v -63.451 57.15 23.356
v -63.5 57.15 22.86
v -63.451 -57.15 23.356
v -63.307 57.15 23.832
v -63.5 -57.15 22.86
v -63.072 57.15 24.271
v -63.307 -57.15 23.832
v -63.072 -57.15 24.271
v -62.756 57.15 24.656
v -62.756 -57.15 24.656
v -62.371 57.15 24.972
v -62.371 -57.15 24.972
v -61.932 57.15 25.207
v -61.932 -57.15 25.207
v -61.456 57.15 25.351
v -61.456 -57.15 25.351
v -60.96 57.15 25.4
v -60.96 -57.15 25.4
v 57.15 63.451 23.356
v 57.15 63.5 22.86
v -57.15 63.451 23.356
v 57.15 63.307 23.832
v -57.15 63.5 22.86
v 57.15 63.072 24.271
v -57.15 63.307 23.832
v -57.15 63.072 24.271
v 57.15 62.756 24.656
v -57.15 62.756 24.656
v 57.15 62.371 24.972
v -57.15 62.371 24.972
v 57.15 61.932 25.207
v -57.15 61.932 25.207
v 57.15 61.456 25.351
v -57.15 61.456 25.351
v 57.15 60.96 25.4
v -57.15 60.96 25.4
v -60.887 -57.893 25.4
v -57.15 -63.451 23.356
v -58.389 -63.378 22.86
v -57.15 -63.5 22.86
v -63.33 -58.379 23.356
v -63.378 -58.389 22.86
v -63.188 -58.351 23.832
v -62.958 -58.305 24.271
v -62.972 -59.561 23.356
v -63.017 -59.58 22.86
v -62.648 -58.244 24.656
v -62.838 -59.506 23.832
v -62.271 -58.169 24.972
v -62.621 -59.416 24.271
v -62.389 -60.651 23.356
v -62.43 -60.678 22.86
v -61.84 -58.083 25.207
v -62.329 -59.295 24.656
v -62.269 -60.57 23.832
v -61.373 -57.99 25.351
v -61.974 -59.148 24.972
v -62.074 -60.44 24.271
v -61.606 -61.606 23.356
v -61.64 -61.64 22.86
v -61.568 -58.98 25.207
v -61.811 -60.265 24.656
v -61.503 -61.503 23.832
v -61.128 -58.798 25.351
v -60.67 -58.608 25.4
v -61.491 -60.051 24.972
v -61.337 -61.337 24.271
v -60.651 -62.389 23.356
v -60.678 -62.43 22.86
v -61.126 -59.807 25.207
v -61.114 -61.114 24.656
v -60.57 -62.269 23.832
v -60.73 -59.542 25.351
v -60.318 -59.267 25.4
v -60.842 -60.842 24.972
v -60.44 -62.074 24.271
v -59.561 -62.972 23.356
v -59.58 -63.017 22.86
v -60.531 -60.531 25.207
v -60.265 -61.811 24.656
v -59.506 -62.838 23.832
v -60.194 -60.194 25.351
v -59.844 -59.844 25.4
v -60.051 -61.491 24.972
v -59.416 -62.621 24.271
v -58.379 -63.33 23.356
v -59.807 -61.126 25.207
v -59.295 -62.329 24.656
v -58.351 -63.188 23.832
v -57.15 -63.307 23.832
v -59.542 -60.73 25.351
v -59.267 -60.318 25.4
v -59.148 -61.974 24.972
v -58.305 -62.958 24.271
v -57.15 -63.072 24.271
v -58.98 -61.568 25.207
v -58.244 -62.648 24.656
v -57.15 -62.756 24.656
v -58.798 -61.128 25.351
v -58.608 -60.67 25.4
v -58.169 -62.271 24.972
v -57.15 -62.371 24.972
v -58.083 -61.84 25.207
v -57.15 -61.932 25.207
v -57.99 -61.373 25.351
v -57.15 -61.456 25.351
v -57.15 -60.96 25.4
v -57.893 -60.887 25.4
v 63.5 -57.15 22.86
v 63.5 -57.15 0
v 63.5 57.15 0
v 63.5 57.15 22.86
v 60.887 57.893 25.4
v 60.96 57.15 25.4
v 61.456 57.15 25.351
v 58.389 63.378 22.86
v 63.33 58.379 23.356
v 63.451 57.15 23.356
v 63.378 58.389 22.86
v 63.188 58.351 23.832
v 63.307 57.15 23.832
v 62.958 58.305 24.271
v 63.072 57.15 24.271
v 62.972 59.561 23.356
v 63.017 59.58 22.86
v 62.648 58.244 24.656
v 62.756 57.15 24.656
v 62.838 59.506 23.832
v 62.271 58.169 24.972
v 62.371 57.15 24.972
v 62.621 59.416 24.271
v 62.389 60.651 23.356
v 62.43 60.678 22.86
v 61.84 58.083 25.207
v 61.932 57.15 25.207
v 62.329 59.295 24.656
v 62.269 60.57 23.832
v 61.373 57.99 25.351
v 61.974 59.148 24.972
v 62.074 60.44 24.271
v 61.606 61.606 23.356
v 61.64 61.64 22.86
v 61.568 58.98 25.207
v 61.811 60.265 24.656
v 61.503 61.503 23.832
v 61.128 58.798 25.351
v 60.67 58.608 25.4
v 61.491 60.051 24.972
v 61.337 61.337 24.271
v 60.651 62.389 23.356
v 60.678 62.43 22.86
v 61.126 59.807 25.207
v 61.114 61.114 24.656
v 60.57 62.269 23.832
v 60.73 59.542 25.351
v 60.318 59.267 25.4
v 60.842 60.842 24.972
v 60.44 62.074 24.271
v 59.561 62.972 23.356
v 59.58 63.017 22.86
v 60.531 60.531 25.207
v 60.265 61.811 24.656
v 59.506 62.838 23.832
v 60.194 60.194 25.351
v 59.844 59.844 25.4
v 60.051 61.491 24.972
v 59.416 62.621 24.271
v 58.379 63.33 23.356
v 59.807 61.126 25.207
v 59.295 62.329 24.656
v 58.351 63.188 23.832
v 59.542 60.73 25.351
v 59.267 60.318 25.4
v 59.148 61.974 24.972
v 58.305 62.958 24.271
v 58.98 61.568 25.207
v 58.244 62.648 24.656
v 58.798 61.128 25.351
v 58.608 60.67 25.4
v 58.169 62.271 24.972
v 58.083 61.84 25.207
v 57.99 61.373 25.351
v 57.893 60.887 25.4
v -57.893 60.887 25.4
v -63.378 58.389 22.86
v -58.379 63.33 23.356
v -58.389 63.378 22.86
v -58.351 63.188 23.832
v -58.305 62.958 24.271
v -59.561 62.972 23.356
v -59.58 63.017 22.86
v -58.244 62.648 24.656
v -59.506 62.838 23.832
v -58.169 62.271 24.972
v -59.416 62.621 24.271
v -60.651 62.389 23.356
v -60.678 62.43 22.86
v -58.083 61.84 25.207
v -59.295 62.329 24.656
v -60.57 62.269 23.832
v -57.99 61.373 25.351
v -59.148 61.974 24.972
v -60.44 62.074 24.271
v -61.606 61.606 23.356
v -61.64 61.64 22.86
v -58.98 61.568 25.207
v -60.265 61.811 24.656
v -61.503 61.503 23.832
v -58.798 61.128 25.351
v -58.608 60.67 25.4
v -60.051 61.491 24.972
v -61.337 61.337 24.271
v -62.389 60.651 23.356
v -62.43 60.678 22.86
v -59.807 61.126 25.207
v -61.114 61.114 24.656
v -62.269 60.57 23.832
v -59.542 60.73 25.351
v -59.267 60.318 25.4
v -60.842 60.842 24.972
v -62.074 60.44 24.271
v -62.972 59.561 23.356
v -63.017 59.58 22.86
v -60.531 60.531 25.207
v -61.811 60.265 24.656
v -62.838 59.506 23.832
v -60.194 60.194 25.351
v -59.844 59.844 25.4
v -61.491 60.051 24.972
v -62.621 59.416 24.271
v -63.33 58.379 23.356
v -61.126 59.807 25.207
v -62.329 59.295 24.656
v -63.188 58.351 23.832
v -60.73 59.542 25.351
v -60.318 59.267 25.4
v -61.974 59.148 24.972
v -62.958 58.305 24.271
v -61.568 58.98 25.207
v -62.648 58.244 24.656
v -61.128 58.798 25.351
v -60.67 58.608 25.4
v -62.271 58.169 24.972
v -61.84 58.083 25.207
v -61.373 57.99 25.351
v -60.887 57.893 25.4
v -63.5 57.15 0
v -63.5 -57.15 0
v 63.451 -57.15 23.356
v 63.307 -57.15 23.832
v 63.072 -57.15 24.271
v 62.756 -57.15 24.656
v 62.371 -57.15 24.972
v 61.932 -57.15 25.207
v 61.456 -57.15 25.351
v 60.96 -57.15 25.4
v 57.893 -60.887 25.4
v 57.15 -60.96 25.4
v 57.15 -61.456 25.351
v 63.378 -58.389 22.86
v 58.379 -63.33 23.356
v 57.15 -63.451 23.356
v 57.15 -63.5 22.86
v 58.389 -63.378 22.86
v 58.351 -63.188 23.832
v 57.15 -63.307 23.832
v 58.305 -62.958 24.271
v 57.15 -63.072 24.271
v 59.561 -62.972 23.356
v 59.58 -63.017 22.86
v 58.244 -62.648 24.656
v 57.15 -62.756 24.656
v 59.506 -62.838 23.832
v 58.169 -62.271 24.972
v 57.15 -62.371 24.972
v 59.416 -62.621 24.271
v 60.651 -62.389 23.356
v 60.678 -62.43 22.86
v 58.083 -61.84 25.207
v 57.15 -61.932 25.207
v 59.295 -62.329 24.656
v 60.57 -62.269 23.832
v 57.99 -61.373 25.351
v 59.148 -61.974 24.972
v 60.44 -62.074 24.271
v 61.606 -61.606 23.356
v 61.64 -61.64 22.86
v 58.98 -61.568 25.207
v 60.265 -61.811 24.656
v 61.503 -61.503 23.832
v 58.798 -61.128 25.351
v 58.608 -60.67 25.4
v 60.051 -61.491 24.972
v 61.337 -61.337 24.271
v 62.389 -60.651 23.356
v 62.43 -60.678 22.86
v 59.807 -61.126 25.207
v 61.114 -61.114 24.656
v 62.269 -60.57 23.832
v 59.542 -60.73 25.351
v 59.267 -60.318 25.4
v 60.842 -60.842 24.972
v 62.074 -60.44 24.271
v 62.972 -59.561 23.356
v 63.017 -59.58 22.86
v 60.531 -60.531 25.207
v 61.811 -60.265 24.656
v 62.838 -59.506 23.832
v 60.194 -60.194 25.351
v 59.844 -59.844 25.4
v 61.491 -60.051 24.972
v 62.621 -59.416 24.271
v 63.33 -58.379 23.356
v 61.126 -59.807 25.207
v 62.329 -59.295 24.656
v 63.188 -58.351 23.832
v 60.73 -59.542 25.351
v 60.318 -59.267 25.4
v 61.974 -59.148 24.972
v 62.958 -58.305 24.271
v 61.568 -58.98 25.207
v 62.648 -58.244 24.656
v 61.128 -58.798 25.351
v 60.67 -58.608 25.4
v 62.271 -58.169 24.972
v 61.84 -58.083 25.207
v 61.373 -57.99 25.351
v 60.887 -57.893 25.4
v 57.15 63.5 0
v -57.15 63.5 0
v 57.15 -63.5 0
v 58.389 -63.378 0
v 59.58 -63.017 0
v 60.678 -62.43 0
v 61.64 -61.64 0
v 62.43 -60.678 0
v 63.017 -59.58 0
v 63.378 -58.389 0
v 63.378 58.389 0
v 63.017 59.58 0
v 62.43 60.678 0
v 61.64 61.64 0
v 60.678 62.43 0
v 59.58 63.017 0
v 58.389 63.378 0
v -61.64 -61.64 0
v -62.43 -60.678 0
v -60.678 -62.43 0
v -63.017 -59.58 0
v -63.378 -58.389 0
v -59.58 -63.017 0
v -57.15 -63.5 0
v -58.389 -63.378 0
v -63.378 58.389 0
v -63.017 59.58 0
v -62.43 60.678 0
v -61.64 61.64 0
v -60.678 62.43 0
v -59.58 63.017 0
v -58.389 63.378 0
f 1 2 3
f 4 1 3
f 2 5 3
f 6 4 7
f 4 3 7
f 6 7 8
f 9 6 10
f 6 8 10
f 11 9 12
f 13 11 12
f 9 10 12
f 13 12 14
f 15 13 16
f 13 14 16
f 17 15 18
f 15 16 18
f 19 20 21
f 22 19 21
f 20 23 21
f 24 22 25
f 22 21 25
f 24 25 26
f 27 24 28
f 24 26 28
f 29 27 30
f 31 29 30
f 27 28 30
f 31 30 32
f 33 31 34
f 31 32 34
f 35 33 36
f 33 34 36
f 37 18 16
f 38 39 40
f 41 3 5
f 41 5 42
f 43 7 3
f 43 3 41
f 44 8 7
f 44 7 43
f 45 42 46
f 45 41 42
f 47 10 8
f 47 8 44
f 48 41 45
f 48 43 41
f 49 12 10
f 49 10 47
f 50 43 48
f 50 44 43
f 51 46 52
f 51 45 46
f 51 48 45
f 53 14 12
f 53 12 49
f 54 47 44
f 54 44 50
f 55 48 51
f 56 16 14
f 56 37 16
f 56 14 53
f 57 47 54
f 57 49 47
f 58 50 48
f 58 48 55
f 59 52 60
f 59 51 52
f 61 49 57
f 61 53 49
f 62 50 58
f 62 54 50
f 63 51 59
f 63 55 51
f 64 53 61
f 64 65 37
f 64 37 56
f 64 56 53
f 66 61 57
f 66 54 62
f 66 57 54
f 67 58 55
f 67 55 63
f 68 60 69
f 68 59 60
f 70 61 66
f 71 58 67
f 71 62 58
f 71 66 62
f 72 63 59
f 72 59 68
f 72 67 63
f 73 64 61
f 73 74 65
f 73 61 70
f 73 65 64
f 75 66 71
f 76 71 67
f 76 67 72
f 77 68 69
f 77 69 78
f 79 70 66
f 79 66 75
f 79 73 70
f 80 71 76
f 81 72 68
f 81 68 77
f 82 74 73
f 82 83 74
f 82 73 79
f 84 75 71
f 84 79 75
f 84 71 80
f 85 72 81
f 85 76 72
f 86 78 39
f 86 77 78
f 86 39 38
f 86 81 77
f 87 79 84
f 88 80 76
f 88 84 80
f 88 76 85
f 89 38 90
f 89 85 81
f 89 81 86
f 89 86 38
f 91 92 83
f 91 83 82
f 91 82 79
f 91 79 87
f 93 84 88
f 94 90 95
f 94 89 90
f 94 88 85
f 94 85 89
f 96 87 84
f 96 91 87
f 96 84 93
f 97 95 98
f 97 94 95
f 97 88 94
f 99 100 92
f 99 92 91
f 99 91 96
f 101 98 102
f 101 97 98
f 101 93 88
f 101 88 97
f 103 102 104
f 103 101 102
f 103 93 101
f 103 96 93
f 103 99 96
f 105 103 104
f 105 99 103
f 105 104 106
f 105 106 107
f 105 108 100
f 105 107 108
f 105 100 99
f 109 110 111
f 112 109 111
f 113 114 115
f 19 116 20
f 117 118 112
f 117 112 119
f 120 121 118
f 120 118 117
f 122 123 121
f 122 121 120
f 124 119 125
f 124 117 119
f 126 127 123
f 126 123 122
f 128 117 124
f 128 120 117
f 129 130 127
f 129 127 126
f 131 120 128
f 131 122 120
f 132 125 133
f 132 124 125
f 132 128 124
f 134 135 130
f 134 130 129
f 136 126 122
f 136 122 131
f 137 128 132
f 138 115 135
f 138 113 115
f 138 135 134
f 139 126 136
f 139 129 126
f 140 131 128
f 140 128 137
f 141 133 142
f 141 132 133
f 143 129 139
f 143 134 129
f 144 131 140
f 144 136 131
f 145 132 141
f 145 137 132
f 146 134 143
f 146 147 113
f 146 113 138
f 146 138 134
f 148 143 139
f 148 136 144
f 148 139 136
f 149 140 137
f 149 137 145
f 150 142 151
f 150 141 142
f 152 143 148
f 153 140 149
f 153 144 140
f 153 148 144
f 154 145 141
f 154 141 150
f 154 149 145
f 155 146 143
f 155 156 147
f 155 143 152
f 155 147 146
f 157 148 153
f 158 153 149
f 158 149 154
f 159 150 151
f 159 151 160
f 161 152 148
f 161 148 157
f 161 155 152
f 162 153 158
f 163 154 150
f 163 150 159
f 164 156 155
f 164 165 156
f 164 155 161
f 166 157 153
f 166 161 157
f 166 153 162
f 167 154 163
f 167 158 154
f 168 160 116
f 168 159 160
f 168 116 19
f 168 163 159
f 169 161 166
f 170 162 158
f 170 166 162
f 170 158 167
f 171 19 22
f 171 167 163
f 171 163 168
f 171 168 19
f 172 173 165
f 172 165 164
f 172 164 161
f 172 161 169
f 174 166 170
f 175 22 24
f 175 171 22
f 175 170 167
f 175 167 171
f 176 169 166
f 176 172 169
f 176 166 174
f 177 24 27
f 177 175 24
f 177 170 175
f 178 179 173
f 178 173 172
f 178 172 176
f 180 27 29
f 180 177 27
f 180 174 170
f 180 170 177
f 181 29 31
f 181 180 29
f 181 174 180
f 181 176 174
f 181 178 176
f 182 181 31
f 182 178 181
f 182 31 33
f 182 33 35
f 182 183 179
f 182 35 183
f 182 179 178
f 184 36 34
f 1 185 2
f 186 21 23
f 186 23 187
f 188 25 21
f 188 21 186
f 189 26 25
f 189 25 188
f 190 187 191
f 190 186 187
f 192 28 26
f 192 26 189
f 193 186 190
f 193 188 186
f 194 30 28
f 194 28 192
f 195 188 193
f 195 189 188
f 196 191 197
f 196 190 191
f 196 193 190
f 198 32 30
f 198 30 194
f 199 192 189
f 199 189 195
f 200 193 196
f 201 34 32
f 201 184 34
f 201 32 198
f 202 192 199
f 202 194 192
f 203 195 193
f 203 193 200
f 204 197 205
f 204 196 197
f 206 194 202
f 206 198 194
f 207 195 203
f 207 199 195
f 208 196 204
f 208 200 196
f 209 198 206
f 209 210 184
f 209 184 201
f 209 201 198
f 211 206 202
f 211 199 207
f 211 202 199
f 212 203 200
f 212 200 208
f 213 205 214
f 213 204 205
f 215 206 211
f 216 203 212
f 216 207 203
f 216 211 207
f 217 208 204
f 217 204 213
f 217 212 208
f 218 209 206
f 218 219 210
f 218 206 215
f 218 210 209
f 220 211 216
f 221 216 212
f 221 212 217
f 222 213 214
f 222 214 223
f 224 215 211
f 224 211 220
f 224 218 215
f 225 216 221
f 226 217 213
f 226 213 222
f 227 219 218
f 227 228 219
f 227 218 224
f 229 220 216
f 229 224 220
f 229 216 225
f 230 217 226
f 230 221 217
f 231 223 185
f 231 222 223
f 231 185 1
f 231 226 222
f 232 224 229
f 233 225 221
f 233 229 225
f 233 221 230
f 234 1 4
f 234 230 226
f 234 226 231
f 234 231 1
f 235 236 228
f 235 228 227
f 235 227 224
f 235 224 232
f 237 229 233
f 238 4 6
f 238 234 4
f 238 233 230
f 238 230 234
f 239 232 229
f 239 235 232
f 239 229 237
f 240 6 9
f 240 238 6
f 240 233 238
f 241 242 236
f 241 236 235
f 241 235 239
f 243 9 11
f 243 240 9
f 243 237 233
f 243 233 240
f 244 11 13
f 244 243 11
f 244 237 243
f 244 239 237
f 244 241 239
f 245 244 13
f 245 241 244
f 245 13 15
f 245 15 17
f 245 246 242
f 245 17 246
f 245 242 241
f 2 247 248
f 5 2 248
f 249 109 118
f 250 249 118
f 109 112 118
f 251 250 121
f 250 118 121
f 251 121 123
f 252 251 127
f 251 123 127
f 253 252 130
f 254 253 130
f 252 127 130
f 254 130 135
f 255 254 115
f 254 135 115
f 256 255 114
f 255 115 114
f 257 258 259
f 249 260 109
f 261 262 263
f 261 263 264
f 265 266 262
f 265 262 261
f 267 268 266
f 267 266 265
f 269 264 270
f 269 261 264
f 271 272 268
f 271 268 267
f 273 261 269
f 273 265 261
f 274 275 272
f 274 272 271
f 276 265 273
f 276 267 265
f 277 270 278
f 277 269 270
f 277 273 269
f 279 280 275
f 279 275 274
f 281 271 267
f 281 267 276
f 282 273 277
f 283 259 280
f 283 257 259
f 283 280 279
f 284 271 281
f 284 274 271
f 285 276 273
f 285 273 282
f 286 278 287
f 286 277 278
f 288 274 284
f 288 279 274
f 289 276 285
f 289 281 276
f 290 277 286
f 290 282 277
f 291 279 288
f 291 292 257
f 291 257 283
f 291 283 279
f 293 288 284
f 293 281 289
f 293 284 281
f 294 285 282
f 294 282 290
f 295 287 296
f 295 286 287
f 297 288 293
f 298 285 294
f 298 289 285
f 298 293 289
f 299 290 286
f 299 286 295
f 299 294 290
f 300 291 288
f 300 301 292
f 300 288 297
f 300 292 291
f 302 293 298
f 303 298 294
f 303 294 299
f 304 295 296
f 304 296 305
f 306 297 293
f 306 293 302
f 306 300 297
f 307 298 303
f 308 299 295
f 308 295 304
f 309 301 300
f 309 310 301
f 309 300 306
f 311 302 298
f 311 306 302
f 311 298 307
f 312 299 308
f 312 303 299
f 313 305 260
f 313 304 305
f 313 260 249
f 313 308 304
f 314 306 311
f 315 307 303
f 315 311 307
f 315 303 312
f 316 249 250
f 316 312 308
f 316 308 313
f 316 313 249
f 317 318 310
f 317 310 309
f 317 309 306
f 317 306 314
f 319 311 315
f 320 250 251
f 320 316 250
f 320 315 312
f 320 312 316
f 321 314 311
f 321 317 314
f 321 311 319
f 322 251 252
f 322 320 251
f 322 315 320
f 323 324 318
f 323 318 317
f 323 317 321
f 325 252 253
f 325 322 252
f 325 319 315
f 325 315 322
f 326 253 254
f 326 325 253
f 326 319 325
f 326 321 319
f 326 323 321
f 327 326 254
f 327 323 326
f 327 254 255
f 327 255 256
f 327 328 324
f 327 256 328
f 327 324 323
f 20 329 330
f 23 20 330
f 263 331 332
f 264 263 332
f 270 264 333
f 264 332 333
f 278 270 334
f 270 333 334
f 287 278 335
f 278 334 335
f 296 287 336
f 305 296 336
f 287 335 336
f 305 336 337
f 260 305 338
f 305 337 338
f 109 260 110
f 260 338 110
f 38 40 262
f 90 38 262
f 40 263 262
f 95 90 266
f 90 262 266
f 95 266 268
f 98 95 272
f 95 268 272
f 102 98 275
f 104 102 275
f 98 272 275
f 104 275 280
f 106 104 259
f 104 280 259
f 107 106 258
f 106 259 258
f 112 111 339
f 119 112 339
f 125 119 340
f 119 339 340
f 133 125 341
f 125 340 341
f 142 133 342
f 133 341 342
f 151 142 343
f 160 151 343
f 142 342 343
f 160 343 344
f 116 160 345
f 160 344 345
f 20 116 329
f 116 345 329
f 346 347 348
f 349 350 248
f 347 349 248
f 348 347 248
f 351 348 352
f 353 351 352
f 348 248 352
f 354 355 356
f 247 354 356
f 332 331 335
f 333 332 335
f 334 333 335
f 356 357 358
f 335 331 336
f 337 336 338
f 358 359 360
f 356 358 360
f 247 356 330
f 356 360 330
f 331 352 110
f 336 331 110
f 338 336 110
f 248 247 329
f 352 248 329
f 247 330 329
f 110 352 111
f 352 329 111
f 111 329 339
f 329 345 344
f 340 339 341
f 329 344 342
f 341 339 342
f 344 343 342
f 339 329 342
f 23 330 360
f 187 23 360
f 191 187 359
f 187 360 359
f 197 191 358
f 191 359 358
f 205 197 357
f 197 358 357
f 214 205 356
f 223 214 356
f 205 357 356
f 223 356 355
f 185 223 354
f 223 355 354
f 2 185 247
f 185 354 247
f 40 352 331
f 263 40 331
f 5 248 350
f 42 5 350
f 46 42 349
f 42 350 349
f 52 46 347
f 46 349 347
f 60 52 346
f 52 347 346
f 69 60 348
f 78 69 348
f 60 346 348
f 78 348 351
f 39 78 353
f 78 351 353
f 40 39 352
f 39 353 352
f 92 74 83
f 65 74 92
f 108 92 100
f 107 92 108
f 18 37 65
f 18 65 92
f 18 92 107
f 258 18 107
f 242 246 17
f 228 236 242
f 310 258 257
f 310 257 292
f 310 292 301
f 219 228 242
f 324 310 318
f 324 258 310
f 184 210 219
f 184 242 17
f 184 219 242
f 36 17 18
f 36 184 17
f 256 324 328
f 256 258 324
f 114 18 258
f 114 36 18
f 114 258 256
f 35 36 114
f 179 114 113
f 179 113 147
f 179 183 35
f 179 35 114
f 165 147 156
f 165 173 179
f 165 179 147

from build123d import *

# Parameters (mm, degrees)
F1_DEPTH = 25.4
F2_R     = 2.54


with BuildPart() as f1:
    # F0 (on Top) → F1 (new body)
    with BuildSketch(Plane.XY):
        with BuildLine():
            Line((57.15, 63.5), (-57.15, 63.5))
            ThreePointArc((-57.15, 63.5), (-61.640128, 61.640128), (-63.5, 57.15))
            Line((-63.5, 57.15), (-63.5, -57.15))
            ThreePointArc((-63.5, -57.15), (-61.640128, -61.640128), (-57.15, -63.5))
            Line((-57.15, -63.5), (57.15, -63.5))
            ThreePointArc((57.15, -63.5), (61.640128, -61.640128), (63.5, -57.15))
            Line((63.5, -57.15), (63.5, 57.15))
            ThreePointArc((63.5, 57.15), (61.640128, 61.640128), (57.15, 63.5))
        make_face()
    extrude(amount=F1_DEPTH)

    # F2
    f2_edges = [f1.edges().sort_by_distance(p)[0] for p in [
        (63.5, 0, 25.4),
    ]]
    fillet(f2_edges, radius=F2_R)


solid = f1.part
